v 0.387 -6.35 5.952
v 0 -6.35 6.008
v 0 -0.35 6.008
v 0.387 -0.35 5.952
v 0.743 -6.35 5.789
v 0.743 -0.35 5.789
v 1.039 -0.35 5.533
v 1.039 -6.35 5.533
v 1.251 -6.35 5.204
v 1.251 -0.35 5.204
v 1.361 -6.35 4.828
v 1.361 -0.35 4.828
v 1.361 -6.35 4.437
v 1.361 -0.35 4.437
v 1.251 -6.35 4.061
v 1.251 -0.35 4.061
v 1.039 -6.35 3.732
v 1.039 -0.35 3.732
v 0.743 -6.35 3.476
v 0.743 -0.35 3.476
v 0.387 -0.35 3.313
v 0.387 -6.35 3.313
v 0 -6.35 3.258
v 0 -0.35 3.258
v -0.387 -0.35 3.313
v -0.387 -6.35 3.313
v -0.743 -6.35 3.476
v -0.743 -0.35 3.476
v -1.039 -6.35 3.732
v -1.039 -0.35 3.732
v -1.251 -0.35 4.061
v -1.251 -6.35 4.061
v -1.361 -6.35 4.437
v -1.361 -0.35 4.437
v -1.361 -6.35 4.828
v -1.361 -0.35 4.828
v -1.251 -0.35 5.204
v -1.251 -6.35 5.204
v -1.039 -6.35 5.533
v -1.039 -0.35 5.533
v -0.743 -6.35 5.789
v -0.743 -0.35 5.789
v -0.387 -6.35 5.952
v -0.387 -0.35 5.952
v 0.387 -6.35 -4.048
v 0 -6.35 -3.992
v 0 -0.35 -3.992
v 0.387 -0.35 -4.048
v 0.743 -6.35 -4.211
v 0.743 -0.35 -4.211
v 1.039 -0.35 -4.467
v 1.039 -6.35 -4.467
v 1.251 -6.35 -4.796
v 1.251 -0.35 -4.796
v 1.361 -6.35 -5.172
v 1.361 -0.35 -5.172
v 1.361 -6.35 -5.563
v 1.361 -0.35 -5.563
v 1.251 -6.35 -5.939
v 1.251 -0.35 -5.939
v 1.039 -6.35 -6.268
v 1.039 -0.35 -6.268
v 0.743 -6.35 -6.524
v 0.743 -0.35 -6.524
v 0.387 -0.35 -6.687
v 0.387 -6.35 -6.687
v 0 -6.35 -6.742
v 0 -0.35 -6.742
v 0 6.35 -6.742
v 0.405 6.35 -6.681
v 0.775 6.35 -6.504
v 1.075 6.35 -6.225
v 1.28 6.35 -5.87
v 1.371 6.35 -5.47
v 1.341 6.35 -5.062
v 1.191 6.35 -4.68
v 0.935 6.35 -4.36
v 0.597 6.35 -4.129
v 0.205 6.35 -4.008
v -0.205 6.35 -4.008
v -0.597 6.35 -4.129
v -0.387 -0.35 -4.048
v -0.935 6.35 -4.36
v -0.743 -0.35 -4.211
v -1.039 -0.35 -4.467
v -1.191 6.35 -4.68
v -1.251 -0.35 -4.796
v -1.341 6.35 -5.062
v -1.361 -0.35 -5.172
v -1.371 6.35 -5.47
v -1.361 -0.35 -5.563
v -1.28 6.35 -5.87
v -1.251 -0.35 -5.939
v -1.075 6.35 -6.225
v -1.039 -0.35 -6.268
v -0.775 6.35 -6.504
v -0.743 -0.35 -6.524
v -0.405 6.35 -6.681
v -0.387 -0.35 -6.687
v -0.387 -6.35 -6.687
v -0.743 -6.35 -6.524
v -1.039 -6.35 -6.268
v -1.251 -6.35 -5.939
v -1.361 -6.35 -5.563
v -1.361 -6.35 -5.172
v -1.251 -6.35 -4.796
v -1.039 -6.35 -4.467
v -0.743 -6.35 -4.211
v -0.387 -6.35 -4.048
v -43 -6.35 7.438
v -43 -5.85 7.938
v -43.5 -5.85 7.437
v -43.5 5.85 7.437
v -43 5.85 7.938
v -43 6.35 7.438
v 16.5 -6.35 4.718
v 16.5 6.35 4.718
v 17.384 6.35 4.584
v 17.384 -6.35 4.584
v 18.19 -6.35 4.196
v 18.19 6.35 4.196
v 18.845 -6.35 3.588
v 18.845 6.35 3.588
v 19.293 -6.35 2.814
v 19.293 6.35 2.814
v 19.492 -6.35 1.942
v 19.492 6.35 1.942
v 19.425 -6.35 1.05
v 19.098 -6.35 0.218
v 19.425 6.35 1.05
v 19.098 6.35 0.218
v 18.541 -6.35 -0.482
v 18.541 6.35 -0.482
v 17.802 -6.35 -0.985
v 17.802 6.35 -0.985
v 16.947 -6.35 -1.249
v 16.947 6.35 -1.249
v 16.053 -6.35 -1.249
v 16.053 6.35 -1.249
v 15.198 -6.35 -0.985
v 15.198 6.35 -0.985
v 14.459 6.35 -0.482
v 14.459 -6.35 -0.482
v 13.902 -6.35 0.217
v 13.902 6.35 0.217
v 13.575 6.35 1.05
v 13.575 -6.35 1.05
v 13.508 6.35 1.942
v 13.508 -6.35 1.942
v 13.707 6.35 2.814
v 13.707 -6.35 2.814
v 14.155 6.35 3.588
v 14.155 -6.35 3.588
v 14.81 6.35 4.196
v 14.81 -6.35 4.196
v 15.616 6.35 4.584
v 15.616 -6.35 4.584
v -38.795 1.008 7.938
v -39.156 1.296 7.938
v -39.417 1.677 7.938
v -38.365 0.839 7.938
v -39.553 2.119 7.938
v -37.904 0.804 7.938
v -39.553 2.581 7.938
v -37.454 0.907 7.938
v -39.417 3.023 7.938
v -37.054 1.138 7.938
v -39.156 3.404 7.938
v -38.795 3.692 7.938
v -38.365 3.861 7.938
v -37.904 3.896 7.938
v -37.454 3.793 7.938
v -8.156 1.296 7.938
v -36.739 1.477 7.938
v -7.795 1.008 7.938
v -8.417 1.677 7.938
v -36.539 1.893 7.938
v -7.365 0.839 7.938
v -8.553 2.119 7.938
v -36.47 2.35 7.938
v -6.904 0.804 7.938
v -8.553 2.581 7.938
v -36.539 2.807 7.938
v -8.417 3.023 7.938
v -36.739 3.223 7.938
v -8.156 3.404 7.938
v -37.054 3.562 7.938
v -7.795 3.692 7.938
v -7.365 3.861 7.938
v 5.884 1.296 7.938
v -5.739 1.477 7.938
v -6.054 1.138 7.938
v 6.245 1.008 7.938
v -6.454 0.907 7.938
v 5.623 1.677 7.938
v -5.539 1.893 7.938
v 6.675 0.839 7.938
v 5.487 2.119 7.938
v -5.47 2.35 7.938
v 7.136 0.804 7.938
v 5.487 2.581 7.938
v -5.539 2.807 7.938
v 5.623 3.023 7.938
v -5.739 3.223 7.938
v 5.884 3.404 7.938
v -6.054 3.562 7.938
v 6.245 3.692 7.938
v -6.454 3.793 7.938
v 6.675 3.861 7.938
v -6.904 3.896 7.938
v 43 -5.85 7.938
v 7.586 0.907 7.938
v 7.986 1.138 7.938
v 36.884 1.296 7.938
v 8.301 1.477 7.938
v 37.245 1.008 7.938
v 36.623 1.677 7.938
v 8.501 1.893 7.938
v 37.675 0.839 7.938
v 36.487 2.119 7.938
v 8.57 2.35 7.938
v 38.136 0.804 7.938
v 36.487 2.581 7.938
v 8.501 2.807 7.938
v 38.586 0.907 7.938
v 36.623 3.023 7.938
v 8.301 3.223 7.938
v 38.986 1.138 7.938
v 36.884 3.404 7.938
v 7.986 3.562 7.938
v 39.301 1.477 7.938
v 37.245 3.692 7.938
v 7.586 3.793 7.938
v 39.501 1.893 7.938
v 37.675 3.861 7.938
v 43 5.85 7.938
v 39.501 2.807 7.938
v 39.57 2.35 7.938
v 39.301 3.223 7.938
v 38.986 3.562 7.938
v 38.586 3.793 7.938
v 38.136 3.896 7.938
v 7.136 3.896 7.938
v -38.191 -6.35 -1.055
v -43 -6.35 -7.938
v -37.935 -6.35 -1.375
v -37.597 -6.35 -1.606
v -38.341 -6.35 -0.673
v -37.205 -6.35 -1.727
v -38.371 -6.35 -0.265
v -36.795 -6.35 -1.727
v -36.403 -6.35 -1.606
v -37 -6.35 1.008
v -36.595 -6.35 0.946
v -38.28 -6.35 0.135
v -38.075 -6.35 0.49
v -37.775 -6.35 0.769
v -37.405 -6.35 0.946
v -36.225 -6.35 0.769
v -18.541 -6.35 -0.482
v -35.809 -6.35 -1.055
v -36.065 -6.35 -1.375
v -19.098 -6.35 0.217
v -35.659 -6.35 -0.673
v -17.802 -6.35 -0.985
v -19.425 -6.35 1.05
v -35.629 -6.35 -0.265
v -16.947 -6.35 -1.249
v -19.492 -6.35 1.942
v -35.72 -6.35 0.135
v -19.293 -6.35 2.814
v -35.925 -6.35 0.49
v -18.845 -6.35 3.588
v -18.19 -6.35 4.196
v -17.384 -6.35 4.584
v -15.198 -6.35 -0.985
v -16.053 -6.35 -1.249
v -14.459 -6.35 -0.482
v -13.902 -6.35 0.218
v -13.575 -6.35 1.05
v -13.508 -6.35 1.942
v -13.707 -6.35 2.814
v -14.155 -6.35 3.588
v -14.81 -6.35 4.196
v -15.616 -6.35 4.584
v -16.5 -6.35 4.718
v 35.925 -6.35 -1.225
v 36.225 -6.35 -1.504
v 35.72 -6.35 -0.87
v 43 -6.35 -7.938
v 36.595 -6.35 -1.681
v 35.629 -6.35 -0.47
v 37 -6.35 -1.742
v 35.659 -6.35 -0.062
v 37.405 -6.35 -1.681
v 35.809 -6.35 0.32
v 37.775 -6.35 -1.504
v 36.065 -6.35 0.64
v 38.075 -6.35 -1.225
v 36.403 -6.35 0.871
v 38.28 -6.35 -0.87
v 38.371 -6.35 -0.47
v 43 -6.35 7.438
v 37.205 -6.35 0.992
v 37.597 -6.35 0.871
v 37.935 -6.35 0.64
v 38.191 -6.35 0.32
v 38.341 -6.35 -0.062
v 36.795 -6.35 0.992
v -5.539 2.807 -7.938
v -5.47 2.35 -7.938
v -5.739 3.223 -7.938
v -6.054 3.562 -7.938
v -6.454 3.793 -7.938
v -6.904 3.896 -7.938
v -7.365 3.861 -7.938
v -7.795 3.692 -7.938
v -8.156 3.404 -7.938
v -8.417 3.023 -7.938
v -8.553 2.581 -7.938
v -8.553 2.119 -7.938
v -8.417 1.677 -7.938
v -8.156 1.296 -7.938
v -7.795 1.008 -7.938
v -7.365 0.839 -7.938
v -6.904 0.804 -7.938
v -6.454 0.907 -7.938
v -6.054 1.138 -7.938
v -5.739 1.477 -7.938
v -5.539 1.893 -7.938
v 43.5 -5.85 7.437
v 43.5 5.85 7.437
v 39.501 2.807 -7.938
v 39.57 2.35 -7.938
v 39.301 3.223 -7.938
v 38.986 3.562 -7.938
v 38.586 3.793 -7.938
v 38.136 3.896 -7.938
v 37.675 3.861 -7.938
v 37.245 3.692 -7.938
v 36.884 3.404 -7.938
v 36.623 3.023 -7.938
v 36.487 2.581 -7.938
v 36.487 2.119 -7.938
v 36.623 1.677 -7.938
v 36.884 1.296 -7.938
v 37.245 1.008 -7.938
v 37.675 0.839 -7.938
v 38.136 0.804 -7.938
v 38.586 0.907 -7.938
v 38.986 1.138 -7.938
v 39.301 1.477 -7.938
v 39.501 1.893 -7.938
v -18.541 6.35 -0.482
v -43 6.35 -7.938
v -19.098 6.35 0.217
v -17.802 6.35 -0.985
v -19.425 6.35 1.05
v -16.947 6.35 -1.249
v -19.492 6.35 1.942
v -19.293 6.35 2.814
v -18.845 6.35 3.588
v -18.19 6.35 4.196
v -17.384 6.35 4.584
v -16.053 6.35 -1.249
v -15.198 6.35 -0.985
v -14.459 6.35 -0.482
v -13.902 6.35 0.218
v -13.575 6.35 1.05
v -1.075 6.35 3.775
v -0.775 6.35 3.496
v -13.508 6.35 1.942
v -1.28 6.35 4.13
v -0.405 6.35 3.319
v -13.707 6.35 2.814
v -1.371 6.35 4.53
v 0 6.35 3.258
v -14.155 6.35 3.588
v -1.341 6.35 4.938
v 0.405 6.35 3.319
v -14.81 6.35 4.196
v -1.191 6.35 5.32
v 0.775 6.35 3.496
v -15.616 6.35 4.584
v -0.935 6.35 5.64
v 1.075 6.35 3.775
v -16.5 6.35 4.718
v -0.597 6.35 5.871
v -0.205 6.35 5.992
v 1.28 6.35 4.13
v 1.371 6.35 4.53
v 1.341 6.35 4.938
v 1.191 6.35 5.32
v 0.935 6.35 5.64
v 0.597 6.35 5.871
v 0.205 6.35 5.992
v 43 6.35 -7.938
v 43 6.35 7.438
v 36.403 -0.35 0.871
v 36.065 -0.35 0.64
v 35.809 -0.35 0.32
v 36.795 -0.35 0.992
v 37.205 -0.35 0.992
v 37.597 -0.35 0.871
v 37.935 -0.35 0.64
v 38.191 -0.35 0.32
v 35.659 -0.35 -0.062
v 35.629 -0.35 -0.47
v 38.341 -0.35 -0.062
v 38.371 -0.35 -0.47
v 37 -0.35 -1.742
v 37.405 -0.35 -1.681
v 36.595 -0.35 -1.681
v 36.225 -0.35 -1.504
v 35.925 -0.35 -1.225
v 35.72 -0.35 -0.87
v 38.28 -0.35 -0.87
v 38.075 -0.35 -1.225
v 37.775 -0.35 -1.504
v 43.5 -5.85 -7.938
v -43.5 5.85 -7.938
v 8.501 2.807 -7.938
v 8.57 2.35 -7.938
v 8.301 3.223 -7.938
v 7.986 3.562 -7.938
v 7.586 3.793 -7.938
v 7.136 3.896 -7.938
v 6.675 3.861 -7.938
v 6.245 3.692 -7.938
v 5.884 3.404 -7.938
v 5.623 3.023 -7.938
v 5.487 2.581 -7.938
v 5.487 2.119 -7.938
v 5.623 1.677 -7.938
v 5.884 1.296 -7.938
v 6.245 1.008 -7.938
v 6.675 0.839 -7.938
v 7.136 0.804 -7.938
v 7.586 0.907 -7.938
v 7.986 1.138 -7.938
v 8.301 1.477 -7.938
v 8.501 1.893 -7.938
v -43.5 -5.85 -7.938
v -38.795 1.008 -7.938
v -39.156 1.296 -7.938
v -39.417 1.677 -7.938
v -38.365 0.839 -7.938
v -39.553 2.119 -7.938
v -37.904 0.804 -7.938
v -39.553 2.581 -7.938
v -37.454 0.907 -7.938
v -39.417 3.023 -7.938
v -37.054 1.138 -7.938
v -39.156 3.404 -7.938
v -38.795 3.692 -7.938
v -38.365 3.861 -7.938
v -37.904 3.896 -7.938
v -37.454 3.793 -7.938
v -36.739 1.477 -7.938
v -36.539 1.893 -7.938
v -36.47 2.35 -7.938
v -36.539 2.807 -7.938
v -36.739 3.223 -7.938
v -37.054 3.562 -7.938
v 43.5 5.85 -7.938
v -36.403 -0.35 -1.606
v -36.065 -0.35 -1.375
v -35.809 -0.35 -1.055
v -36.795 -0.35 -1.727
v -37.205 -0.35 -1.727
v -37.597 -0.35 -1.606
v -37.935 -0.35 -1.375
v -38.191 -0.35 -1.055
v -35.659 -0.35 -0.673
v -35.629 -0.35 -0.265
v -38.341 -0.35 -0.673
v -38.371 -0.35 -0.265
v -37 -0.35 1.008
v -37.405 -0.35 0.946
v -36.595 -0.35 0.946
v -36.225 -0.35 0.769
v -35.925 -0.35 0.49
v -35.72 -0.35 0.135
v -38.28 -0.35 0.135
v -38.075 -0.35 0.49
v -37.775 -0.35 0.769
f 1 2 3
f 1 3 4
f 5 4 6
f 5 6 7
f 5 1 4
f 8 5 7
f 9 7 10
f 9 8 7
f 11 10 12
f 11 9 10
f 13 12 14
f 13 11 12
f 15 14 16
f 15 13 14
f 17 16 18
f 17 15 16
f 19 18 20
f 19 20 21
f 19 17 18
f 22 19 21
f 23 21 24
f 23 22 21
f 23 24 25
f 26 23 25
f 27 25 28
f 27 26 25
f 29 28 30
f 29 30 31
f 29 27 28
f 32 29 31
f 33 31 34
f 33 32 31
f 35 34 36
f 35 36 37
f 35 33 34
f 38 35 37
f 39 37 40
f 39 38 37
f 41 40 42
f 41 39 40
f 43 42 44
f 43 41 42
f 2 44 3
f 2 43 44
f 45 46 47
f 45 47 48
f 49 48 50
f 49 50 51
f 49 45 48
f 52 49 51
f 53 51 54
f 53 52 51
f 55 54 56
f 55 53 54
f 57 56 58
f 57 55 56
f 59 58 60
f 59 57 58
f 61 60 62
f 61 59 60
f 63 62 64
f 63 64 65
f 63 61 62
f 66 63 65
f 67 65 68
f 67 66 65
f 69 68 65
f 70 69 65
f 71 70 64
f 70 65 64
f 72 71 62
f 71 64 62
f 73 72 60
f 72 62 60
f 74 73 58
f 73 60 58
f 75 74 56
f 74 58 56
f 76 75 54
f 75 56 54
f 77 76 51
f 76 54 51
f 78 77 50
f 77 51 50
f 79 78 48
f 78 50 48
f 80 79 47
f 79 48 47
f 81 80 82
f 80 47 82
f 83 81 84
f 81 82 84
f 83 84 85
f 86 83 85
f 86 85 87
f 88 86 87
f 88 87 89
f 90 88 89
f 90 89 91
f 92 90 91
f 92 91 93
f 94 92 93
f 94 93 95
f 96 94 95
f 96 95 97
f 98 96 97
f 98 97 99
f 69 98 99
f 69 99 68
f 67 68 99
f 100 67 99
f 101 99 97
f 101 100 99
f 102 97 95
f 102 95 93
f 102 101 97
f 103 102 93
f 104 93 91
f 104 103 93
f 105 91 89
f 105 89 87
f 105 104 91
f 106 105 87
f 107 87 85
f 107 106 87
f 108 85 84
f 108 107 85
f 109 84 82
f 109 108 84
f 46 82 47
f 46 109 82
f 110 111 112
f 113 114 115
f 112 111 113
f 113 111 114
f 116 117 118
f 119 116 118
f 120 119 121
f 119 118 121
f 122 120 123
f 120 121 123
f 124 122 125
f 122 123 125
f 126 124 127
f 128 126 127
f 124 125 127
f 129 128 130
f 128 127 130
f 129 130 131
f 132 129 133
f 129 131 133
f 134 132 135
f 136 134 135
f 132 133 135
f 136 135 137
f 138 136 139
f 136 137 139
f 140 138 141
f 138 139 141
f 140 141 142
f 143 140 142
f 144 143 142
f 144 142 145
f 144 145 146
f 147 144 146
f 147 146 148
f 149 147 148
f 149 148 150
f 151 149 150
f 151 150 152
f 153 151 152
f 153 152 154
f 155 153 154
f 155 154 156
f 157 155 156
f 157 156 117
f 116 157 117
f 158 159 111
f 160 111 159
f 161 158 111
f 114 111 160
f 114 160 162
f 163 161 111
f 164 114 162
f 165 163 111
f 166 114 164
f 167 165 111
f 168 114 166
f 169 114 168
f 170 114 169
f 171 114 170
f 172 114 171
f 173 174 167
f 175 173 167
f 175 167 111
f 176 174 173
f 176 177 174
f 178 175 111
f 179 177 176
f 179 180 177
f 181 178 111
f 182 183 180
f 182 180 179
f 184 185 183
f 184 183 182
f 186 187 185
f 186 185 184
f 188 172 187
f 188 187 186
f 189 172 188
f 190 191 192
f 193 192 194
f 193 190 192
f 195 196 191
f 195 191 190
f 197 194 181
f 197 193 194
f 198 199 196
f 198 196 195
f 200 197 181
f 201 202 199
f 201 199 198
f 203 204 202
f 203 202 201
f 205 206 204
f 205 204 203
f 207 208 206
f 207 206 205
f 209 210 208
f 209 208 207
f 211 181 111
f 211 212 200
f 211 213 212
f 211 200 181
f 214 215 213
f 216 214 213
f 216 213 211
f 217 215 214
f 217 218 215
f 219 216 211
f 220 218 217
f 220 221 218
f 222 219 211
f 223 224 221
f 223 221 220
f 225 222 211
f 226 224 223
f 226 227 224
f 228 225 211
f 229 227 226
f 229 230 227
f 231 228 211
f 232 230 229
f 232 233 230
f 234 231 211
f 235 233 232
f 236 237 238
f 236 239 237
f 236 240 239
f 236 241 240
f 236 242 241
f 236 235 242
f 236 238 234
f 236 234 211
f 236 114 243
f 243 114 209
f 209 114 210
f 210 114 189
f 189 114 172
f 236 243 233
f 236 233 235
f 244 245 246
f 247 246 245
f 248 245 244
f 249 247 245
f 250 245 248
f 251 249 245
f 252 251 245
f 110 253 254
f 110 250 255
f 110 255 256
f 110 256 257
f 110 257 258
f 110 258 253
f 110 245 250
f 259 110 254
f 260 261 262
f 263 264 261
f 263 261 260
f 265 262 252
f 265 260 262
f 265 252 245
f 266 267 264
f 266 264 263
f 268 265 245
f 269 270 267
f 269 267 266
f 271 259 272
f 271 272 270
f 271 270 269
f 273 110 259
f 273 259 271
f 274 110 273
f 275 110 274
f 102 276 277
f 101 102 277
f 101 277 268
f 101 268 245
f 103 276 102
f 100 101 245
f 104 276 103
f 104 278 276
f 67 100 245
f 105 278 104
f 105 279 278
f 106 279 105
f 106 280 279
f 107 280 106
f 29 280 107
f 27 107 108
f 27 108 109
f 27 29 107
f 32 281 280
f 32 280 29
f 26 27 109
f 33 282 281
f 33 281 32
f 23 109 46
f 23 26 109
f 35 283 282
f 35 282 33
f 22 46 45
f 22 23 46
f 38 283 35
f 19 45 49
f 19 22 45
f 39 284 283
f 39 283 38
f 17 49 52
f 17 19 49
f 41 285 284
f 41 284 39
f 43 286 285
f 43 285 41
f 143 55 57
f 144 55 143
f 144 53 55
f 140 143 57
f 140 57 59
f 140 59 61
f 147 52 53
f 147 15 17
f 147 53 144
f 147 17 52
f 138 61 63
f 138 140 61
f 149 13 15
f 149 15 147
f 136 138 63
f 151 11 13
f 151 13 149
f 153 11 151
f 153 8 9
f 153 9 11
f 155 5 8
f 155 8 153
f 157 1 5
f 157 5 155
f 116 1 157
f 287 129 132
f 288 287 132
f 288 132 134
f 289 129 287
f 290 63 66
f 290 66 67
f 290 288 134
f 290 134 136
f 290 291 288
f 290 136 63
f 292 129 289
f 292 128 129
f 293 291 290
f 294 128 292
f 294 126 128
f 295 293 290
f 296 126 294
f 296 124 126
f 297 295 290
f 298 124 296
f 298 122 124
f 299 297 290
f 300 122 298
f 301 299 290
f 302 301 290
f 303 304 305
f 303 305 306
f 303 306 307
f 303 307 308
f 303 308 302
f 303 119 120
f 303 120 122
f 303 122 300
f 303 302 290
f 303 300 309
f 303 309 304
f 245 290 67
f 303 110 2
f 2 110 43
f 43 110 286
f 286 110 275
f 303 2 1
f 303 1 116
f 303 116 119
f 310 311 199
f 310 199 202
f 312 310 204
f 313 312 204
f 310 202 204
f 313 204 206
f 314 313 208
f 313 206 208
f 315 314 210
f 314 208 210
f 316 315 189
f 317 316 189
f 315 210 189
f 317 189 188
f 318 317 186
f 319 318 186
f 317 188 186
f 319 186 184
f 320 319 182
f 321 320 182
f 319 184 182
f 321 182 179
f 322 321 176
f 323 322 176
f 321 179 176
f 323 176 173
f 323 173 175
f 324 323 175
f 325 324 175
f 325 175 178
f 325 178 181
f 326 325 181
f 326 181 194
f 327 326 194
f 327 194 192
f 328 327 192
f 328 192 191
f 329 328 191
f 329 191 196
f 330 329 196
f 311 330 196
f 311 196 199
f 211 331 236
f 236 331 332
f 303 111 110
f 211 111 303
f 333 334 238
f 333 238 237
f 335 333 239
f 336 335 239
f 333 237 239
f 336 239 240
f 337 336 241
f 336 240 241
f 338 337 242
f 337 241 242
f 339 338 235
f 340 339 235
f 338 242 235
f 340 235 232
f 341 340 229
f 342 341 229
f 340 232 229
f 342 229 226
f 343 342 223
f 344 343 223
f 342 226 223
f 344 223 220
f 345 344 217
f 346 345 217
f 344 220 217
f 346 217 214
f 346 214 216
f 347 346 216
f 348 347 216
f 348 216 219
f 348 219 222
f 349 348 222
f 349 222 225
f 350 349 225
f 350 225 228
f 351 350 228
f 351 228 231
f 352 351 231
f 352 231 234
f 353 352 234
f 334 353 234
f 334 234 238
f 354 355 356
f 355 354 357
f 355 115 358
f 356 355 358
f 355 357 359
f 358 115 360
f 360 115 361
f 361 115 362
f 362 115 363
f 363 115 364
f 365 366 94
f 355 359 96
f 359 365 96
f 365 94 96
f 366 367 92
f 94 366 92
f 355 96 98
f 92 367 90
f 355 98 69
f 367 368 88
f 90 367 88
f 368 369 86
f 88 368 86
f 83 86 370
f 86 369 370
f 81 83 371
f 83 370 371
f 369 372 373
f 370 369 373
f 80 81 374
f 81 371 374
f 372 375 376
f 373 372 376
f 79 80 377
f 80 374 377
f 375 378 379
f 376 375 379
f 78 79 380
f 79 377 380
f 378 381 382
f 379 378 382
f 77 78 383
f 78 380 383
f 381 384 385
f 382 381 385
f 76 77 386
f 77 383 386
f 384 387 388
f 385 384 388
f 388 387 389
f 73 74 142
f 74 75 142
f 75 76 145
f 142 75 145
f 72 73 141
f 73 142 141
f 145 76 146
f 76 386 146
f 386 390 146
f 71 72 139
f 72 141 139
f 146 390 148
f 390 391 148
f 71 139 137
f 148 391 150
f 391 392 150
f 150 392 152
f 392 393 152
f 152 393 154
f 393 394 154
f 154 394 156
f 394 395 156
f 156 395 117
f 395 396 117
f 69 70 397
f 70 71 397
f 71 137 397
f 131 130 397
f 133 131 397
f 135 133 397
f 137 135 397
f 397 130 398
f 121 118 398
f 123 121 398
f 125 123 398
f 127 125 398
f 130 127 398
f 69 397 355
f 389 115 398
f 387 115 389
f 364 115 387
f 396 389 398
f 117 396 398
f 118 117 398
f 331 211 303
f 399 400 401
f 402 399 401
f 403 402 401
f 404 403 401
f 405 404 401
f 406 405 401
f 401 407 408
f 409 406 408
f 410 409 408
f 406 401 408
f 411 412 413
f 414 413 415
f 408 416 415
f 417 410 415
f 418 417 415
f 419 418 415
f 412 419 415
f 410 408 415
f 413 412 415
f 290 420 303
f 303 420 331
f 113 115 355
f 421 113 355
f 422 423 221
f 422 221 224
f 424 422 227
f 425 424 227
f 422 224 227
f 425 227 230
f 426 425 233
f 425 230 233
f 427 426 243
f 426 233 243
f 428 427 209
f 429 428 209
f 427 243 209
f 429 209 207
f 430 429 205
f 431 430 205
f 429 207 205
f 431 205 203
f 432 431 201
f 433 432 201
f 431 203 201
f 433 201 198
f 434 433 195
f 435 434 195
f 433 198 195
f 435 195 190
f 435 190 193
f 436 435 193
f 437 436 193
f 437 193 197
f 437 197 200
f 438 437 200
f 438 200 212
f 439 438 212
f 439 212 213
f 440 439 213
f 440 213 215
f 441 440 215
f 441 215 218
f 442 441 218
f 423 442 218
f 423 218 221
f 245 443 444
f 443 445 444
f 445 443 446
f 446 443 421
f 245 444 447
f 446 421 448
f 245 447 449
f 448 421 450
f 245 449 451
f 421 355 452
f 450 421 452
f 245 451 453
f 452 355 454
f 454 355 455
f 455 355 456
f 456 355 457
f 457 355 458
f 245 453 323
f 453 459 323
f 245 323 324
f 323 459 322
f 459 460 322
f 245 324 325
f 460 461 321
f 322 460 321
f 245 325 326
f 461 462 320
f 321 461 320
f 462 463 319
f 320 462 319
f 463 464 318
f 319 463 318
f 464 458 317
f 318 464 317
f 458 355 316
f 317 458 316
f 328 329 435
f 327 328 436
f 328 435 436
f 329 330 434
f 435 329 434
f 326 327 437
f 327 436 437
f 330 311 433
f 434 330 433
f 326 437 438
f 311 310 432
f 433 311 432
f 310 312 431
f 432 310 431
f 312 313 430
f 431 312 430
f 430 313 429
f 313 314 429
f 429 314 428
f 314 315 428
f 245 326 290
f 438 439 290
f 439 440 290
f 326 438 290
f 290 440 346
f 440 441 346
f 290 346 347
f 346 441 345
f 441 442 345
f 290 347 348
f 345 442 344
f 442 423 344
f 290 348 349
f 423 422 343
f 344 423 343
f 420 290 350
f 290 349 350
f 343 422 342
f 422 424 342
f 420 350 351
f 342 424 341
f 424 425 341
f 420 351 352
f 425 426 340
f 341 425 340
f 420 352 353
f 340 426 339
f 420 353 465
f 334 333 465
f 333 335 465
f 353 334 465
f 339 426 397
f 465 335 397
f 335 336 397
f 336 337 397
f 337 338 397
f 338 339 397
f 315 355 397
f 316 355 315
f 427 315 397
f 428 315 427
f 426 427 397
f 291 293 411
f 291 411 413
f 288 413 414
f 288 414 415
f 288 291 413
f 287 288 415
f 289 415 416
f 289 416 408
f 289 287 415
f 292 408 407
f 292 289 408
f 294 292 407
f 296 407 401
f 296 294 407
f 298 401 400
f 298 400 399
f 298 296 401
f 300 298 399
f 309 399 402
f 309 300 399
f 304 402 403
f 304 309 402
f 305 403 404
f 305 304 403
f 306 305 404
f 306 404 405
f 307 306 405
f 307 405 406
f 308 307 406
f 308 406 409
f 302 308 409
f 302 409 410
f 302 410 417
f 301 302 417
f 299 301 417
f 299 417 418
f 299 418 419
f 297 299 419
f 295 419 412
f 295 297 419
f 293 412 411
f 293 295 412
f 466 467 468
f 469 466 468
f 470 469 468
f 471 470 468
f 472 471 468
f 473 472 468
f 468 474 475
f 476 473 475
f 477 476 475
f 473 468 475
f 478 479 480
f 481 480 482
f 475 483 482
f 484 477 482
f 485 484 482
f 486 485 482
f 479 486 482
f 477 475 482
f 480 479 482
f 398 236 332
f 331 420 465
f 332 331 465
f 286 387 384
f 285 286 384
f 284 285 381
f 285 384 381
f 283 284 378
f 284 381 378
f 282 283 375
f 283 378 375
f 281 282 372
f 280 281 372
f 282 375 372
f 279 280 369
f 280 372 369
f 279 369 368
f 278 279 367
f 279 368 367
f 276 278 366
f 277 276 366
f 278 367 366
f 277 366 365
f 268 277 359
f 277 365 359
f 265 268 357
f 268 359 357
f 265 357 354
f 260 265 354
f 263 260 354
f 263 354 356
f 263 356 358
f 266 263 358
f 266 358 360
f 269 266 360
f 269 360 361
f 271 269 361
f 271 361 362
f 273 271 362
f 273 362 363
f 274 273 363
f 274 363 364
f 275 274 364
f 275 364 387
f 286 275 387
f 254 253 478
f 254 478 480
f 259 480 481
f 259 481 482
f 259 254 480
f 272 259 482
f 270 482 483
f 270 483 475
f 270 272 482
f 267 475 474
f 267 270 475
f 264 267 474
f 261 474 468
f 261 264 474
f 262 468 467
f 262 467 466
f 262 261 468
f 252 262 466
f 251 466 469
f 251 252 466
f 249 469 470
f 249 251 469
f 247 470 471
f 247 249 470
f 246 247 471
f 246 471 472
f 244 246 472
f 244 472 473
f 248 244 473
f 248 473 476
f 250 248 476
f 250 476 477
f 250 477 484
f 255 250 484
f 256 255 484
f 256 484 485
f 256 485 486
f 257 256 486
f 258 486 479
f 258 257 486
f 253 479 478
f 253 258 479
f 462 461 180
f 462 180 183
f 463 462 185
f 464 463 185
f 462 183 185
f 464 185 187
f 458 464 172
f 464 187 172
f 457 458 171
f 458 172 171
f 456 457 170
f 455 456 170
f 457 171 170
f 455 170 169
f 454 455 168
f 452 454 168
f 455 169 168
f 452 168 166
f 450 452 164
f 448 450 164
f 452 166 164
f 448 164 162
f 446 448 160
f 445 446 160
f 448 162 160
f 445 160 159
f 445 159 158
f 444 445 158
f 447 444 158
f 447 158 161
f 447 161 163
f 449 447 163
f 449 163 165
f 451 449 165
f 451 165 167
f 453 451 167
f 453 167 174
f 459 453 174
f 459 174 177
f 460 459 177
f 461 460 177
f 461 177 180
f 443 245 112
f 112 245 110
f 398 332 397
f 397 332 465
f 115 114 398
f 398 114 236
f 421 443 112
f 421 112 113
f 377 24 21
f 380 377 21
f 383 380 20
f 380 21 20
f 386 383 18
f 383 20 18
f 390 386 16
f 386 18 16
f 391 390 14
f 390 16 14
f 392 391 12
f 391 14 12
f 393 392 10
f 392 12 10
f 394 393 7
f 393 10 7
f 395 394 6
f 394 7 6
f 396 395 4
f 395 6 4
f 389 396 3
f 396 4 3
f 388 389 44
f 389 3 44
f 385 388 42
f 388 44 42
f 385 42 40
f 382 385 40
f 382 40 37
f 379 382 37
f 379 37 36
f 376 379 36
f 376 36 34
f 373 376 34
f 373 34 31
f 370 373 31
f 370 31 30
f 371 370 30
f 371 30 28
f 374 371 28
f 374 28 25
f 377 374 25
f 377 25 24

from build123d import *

# Parameters (mm, degrees)
SKETCH1_W           = 87
SKETCH1_H           = 12.7
BOSS_EXTRUDE1_DEPTH = 7.9375
SKETCH4_R           = 3
CUT_EXTRUDE2_DEPTH  = 47.005911645
SKETCH2_R           = 1.55
CUT_EXTRUDE1_DEPTH  = 47.739577715
CHAMFER3_SIZE       = 0.5
SKETCH5_R           = 1.375
CUT_EXTRUDE3_DEPTH  = 6
SKETCH6_R           = 1.375
CUT_EXTRUDE4_DEPTH  = 47.005911645


with BuildPart() as part:
    # Sketch1 → Boss-Extrude1 (new, symmetric)
    with BuildSketch(Plane.XY):
        Rectangle(SKETCH1_W, SKETCH1_H)
    extrude(amount=BOSS_EXTRUDE1_DEPTH, both=True)

    # Sketch4 → Cut-Extrude2 (cut, through all)
    with BuildSketch(Plane(origin=(0, 6.35, 0), x_dir=(1, 0, 0), z_dir=(0, 1, 0))):
        with Locations(Location((16.5, -1.7175, 0), (0, 0, 270))):
            Circle(SKETCH4_R)
        with Locations(Location((-16.5, -1.7175, 0), (0, 0, 270))):
            Circle(SKETCH4_R)
    extrude(amount=-CUT_EXTRUDE2_DEPTH, mode=Mode.SUBTRACT)

    # Sketch2 → Cut-Extrude1 (cut, through all)
    with BuildSketch(Plane.XY.offset(7.9375)):
        with Locations((-38.02, 2.35)):
            Circle(SKETCH2_R)
        with Locations((7.02, 2.35)):
            Circle(SKETCH2_R)
        with Locations((-7.02, 2.35)):
            Circle(SKETCH2_R)
        with Locations((38.02, 2.35)):
            Circle(SKETCH2_R)
    extrude(amount=-CUT_EXTRUDE1_DEPTH, mode=Mode.SUBTRACT)

    # Chamfer3
    chamfer3_edges = [part.edges().sort_by_distance(p)[0] for p in [
        (-43.5, 0, 7.9375),
        (0, -6.35, 7.9375),
        (43.5, 0, 7.9375),
        (0, 6.35, 7.9375),
        (43.5, -6.35, 0),
        (-43.5, -6.35, 0),
        (-43.5, 6.35, 0),
        (43.5, 6.35, 0),
    ]]
    chamfer(chamfer3_edges, length=CHAMFER3_SIZE)

    # Sketch5 → Cut-Extrude3 (cut)
    with BuildSketch(Plane(origin=(0, -6.35, 0), x_dir=(1, 0, 0), z_dir=(0, 1, 0))):
        with Locations(Location((-37, 0.3675, 0), (0, 0, 270))):
            Circle(SKETCH5_R)
        with Locations(Location((0, 5.3675, 0), (0, 0, 270))):
            Circle(SKETCH5_R)
        with Locations(Location((37, 0.3675, 0), (0, 0, 90))):
            Circle(SKETCH5_R)
        with Locations(Location((0, -4.6325, 0), (0, 0, 270))):
            Circle(SKETCH5_R)
    extrude(amount=CUT_EXTRUDE3_DEPTH, mode=Mode.SUBTRACT)

    # Sketch6 → Cut-Extrude4 (cut, through all)
    with BuildSketch(Plane.XZ.offset(6.35)):
        with Locations(Location((0, 4.6325, 0), (0, 0, 270))):
            Circle(SKETCH6_R)
        with Locations(Location((0, -5.3675, 0), (0, 0, 270))):
            Circle(SKETCH6_R)
    extrude(amount=-CUT_EXTRUDE4_DEPTH, mode=Mode.SUBTRACT)


solid = part.part
